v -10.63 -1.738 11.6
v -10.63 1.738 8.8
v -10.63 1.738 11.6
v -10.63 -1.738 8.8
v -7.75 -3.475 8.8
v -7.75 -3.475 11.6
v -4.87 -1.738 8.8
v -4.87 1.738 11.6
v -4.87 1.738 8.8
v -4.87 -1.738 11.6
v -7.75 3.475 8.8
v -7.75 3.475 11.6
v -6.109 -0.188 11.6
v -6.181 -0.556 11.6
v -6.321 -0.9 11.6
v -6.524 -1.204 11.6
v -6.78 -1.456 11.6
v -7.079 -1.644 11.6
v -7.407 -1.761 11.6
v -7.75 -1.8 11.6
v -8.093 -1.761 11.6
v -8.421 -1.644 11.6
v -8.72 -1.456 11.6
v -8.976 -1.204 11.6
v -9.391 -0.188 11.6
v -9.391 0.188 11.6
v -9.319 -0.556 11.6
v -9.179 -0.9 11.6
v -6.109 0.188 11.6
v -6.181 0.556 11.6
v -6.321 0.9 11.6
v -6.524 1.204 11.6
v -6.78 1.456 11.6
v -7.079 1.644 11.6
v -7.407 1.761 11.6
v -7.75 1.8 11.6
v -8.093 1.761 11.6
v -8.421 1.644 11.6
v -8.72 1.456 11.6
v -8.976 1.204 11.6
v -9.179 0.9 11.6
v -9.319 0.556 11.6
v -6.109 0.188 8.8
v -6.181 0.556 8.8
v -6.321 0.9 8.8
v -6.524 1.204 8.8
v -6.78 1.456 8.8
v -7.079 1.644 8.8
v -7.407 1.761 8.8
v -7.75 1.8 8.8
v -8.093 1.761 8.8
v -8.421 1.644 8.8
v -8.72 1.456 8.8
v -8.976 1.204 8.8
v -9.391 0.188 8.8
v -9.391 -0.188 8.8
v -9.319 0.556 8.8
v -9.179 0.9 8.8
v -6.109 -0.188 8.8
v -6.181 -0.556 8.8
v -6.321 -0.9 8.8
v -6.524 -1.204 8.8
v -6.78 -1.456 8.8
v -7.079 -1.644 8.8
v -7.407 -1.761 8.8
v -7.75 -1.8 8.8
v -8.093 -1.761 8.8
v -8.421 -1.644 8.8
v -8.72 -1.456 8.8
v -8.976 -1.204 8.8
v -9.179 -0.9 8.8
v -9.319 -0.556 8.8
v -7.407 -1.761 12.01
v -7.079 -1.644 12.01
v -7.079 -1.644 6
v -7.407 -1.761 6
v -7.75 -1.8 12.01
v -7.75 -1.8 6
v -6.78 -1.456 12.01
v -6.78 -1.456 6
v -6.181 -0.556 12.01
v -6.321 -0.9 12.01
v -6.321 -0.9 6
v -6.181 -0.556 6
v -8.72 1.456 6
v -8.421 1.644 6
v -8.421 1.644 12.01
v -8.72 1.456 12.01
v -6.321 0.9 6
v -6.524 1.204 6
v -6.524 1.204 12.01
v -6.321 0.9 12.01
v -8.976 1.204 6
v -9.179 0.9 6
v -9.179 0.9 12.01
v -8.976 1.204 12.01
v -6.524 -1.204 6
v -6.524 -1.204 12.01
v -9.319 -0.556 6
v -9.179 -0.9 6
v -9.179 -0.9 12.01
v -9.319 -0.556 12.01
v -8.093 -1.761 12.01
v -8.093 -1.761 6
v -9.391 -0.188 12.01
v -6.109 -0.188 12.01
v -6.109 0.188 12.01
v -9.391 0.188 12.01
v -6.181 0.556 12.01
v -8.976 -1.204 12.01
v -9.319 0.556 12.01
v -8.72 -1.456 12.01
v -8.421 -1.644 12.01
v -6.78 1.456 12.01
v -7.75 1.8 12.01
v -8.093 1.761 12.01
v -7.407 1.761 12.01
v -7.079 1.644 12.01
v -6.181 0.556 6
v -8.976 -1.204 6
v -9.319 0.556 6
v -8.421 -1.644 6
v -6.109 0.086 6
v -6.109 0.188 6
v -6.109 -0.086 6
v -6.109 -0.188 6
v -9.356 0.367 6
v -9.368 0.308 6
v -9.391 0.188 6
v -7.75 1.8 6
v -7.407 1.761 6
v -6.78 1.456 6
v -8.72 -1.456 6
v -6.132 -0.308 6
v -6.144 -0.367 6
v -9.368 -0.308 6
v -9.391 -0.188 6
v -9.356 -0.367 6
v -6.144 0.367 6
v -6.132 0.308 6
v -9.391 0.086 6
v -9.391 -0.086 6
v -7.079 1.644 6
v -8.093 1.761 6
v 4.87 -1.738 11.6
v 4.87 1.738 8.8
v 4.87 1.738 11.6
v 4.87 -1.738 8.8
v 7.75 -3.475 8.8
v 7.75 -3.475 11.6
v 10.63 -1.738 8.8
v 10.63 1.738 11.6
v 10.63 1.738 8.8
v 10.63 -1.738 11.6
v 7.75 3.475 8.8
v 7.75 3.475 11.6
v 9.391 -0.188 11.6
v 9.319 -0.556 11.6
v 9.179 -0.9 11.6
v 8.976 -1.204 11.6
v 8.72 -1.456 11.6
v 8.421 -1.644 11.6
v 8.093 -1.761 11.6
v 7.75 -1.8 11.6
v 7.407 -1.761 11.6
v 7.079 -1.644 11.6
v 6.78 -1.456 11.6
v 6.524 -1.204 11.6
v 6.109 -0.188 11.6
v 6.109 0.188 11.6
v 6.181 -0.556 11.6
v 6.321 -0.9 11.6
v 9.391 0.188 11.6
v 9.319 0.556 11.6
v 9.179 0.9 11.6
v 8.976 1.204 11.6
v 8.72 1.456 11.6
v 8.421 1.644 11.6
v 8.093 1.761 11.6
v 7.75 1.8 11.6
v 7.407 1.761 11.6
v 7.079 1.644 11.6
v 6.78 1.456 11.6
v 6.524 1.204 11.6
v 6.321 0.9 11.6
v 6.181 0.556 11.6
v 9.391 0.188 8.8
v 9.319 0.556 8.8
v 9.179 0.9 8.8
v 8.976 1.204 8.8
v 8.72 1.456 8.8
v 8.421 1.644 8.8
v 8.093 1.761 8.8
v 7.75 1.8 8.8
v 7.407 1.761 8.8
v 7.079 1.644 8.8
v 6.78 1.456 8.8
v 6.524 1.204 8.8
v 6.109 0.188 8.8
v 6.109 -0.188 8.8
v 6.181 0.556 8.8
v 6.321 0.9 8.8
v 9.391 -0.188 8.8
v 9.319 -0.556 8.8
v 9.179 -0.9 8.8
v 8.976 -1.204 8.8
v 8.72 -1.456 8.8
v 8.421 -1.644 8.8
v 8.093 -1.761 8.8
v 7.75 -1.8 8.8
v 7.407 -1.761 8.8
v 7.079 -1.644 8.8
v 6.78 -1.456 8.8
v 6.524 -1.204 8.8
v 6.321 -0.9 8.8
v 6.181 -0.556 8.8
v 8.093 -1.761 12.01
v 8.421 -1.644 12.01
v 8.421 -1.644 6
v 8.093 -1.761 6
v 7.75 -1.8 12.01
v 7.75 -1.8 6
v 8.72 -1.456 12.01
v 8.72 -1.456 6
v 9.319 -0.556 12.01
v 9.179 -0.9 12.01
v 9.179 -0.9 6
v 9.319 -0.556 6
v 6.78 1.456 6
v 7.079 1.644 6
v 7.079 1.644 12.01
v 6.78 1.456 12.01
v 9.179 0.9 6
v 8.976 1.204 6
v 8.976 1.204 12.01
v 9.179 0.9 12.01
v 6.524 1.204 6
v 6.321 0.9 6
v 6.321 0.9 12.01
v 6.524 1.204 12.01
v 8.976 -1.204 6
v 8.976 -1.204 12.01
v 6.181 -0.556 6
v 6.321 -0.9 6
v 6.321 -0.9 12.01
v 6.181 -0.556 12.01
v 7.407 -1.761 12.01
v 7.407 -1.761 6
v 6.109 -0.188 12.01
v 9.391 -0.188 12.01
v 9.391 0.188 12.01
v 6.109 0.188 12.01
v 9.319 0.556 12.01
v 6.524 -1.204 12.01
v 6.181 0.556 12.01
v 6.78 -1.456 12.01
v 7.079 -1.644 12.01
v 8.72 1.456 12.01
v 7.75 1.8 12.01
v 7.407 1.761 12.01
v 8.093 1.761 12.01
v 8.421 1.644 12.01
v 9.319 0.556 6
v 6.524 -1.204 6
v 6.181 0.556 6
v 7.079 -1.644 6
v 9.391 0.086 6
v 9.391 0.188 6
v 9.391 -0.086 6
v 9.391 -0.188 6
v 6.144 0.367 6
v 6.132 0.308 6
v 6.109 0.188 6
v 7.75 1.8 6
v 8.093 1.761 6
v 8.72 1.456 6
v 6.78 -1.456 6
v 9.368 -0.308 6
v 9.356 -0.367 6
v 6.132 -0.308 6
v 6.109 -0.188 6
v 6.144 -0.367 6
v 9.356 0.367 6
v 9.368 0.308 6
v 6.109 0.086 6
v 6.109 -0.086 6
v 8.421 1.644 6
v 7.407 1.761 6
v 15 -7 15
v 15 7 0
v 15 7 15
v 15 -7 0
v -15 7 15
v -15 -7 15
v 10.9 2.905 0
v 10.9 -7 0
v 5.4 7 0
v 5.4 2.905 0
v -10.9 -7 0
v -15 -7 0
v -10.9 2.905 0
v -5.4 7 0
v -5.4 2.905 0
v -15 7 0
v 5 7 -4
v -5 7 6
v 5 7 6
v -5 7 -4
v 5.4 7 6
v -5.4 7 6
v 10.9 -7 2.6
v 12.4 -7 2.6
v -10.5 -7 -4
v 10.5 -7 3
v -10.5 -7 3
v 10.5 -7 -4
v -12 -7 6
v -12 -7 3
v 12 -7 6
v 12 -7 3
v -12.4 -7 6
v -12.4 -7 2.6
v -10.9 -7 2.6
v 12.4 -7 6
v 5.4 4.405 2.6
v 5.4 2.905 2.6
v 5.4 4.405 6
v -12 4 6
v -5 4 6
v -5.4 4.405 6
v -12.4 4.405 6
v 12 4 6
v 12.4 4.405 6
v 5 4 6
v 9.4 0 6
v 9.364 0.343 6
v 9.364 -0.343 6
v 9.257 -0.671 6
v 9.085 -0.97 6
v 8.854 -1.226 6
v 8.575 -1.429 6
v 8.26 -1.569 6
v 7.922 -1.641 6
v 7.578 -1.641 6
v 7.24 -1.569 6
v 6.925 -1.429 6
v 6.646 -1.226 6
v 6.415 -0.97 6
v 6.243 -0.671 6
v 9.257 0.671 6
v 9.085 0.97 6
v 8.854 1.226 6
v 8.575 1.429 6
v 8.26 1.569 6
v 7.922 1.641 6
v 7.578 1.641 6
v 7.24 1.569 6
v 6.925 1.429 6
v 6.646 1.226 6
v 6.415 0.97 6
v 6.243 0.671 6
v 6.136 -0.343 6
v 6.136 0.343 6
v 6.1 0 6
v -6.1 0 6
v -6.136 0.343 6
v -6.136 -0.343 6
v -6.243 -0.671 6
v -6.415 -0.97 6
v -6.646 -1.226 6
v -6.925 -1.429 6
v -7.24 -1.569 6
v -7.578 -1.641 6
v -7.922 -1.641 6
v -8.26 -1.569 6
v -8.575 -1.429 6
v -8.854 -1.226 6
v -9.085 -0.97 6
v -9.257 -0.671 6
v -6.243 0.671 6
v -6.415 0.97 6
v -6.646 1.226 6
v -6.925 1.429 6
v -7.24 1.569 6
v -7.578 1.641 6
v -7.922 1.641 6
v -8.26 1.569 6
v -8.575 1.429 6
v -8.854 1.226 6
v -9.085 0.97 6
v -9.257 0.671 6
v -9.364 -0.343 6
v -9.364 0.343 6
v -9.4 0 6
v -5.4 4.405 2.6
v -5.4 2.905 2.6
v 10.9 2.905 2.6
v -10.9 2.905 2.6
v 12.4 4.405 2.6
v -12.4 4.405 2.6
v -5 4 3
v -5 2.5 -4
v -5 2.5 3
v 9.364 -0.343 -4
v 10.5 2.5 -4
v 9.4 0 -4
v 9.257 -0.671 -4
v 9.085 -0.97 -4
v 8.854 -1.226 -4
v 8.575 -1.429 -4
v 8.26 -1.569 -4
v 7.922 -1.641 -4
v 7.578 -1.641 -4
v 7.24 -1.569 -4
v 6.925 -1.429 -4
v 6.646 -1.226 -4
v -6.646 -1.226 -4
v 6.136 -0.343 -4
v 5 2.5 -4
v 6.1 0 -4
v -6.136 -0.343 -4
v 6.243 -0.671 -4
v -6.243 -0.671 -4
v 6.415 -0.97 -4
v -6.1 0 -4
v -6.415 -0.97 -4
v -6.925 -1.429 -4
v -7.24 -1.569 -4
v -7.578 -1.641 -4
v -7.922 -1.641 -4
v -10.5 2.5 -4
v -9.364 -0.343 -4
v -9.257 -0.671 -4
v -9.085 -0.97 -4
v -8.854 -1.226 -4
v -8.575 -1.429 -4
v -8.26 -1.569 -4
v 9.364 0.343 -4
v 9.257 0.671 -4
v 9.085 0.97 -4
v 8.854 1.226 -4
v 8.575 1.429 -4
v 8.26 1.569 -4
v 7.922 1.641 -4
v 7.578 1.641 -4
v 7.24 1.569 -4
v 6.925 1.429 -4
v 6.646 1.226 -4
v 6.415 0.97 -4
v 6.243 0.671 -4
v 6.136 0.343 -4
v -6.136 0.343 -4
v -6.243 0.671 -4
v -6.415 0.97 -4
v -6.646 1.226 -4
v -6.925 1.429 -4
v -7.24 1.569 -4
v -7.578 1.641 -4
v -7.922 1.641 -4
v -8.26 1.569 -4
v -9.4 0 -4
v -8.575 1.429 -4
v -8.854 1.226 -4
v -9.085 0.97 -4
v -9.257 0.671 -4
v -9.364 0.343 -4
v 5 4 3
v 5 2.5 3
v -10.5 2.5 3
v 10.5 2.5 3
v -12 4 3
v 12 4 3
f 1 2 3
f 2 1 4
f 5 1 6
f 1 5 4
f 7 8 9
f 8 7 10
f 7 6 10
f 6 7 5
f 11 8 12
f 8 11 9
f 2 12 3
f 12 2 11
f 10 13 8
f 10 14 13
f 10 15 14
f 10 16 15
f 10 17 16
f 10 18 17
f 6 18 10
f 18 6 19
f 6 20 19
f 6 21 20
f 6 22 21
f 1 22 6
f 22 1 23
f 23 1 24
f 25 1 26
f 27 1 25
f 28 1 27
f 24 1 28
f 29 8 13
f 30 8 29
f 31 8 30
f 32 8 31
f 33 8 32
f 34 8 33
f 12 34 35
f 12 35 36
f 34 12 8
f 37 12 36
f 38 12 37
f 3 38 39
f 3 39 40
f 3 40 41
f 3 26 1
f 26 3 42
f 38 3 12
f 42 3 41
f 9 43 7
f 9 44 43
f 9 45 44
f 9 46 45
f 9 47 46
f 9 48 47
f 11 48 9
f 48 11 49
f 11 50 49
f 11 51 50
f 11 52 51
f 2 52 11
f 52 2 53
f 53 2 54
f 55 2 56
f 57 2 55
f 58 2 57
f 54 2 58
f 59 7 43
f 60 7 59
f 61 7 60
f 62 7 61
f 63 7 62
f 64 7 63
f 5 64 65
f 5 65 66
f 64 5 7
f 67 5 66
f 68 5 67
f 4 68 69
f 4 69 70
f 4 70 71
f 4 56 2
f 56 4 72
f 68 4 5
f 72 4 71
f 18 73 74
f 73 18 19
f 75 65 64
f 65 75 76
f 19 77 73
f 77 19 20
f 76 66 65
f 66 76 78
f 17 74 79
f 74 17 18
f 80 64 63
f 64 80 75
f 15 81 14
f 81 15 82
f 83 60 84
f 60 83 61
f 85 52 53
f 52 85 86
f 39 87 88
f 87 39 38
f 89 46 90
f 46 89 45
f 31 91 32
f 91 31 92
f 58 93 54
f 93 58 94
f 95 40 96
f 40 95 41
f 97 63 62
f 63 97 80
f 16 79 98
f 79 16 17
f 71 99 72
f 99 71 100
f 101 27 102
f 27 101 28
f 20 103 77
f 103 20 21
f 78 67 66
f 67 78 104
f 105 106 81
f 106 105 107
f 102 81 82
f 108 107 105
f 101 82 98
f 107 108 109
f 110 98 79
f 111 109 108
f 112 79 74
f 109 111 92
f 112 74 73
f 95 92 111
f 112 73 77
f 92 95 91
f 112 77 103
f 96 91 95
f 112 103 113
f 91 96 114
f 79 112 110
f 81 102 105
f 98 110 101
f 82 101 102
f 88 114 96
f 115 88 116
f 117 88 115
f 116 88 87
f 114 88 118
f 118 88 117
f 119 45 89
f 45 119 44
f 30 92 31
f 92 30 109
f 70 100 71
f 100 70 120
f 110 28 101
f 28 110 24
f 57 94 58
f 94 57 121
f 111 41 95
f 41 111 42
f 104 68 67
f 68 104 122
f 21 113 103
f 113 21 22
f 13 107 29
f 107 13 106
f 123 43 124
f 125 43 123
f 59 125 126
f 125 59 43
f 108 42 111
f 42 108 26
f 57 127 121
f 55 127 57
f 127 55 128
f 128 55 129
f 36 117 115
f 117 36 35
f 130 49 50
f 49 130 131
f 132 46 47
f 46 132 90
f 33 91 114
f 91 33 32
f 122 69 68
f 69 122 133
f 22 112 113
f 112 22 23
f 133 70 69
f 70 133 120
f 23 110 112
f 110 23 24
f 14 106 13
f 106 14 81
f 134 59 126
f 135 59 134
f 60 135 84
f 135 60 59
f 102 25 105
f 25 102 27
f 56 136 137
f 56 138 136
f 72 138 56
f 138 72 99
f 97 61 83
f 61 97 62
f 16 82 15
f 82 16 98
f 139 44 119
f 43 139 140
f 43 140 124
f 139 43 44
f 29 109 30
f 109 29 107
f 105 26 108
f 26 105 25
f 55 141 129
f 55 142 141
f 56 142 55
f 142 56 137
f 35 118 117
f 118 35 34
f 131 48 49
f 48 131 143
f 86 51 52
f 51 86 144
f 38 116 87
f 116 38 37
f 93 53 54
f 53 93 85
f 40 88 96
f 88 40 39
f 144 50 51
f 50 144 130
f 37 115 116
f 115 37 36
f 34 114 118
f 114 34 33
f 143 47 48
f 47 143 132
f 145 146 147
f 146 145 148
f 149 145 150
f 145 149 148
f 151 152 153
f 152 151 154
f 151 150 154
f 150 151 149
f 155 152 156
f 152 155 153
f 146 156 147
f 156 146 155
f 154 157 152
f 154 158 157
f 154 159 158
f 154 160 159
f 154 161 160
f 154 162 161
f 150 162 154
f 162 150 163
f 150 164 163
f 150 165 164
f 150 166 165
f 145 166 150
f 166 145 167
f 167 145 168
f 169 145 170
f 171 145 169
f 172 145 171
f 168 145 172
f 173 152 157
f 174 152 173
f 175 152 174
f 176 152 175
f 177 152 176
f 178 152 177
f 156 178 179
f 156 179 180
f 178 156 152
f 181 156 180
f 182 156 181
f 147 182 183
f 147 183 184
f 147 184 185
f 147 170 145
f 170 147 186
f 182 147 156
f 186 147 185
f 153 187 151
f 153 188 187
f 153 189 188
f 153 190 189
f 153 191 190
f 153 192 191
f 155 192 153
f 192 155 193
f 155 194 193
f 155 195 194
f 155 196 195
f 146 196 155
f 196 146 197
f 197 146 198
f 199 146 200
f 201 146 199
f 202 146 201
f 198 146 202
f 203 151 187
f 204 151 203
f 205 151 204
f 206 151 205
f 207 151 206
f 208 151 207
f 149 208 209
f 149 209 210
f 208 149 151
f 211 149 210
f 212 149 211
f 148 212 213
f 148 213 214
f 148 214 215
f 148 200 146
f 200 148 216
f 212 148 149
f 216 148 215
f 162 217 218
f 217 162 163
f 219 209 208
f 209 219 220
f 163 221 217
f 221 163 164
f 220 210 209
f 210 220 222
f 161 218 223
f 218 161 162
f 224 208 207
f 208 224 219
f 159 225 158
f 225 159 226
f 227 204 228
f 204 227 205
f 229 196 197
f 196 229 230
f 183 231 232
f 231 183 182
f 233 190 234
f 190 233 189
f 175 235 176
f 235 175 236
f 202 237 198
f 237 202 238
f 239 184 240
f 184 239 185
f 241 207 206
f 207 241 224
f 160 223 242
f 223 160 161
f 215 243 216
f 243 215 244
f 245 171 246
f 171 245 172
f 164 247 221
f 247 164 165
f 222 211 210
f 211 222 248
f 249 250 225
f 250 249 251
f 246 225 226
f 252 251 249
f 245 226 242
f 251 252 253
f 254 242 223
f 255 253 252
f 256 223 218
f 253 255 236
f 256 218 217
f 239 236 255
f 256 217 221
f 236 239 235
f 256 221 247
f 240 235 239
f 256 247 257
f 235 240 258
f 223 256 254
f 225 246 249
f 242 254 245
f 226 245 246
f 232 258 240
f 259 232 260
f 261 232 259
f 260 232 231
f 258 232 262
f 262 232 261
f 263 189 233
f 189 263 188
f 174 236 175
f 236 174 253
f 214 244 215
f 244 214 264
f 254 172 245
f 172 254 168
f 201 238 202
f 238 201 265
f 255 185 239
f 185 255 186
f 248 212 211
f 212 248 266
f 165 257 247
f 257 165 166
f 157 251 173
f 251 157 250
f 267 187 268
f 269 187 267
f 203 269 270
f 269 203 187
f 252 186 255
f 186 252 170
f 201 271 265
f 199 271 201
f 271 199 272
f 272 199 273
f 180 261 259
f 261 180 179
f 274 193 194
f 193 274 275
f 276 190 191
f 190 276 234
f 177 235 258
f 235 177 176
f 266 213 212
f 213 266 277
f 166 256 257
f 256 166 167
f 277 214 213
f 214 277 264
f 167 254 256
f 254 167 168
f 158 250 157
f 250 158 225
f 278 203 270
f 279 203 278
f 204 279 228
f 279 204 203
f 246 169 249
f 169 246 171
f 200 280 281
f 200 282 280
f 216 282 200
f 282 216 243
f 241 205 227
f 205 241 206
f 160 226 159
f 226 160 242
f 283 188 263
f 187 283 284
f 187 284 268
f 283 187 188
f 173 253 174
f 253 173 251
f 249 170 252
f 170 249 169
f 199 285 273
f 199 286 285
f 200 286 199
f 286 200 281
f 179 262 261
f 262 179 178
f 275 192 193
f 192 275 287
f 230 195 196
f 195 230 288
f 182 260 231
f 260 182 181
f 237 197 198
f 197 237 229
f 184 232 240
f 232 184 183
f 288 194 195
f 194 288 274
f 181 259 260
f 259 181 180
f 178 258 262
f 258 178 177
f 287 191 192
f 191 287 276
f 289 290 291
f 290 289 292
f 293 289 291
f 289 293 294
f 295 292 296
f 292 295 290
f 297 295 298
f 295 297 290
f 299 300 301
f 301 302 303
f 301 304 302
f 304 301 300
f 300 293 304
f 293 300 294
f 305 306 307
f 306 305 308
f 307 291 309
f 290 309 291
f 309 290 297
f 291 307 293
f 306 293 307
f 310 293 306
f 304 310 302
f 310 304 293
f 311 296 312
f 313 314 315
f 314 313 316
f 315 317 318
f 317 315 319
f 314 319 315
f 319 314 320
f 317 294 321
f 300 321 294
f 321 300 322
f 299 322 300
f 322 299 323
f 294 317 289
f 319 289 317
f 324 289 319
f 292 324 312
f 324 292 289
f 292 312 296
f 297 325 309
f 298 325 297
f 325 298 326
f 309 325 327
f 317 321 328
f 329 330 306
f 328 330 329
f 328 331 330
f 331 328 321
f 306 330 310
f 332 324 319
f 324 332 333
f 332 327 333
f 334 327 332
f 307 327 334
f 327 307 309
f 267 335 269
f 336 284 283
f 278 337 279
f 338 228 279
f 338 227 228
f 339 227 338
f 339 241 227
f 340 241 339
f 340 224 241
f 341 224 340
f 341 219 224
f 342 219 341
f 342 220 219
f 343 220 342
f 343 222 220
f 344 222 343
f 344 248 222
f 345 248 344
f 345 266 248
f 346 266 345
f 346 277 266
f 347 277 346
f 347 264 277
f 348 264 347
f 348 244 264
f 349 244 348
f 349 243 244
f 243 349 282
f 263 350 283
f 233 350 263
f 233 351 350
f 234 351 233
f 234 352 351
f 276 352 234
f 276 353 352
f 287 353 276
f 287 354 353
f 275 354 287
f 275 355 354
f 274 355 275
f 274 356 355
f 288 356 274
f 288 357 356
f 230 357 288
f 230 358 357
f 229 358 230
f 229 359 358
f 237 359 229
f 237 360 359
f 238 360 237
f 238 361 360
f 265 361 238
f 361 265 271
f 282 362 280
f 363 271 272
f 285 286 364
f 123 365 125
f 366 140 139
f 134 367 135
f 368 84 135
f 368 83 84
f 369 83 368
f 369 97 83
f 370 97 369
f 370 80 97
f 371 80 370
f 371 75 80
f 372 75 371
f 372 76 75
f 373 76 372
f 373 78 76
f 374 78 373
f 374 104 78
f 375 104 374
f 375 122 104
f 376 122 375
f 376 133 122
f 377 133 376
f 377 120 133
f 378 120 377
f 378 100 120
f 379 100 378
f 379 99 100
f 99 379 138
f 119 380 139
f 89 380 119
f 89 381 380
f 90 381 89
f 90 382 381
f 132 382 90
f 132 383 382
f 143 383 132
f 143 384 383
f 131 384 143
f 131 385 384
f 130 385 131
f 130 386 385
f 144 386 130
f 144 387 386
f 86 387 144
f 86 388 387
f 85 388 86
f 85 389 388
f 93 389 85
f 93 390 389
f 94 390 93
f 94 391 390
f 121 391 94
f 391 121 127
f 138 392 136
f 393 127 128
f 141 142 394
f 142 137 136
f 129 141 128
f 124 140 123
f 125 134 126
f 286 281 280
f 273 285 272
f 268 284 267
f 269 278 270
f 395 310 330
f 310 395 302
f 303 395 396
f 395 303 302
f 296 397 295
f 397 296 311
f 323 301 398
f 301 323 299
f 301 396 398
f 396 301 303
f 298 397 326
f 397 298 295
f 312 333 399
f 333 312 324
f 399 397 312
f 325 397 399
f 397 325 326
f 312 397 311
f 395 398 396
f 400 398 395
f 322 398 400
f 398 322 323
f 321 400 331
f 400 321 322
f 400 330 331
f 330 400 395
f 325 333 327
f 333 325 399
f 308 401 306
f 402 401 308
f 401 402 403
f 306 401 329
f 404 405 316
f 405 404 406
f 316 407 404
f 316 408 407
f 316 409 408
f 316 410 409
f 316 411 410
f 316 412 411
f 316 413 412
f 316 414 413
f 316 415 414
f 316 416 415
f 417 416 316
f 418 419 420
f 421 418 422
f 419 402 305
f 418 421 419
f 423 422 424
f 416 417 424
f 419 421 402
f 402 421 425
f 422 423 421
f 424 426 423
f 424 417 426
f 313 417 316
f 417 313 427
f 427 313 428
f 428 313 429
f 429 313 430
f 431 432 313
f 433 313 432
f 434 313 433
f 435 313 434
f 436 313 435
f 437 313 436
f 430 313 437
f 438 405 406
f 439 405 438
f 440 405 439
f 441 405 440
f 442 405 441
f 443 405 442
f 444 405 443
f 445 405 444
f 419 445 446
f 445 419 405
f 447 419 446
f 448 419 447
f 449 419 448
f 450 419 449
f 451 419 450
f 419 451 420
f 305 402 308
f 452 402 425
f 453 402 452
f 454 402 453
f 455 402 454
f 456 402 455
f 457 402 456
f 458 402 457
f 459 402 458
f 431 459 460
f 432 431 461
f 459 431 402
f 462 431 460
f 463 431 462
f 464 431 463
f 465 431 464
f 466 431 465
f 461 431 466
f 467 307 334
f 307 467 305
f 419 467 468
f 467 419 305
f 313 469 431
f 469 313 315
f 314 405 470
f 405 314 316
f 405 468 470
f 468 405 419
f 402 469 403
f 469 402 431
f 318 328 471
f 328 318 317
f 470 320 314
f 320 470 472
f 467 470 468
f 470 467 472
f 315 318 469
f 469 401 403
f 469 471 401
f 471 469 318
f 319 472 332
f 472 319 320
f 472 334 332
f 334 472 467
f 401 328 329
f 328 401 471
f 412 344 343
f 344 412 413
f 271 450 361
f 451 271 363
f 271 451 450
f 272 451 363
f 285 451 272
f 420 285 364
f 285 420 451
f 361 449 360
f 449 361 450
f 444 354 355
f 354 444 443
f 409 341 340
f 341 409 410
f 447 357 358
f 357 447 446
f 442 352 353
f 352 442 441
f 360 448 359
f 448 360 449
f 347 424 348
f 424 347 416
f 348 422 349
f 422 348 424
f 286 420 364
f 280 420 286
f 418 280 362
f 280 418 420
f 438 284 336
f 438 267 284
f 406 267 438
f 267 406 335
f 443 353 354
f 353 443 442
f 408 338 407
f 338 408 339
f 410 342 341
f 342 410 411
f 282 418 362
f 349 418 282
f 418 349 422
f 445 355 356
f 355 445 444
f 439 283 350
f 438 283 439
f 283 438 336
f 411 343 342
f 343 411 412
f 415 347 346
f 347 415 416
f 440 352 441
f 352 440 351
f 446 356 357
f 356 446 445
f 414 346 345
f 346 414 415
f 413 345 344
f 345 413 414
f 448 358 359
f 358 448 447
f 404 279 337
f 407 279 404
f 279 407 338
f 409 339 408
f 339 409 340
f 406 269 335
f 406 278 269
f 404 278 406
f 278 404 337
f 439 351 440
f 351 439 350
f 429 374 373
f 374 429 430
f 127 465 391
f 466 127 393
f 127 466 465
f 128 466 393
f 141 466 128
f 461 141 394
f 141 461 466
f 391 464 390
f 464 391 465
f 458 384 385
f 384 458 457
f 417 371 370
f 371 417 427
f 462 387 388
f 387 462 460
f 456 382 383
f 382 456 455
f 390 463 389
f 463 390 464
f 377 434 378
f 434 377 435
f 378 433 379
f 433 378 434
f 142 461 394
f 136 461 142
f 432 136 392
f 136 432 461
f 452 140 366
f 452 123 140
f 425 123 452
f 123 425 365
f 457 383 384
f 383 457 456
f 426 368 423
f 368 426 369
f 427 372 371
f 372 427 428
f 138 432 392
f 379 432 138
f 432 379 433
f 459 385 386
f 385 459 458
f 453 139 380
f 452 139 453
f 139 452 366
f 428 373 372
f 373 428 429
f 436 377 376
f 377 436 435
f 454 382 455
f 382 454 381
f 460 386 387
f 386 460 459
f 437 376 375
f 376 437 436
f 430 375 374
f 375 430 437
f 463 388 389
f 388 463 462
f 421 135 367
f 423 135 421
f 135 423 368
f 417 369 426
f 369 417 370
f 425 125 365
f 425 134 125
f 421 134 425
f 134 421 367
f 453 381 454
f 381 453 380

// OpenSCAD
// BambuLab A1 Mounting Bracket
include <BOSL2/std.scad>

/* [Bracket Dimensions (mm)] */
bracket_thickness = 5; // [3:1:10]
bracket_width = 50; // [10:1:50]
dovetail_depth = 5; // [10:1:30]
dovetail_gap = .6; // [.1:.1:1]

/* [Hidden] */
//$preview = true;
local = 0;
$fa = $preview ? 8 : 1;
$fs = $preview ? 1 : 0.1;

// Manifest dimensions (A1 traversal)
a1_inner_width = 40.5;
a1_inner_height = 20.5;
a1_inner_radius = 5;

wall_thickness = 1.5; // [0.4:0.1:5]
layer_height = 0.2;
tolerance = 0.25;
epsilon = 0.05;
chamfer = 0.3;


// Generates an open 2D path that wraps left/right along the front wall face
function dovetail_flanged_wall_path(width=dovetail_depth / 4, depth=dovetail_depth, angle=45, flange_width=35, tolerance=tolerance) =
    let(
        w_neck = width + (2 * tolerance),
        w_base = w_neck + (2 * depth * tan(angle)),

        // Coordinates for the flanged track running along the face and into the socket:
        p1 = [-w_neck/2 - flange_width, 0], // Far Left Flange (on the face)
        p2 = [-w_neck/2, 0],                // Left Neck Entry
        p3 = [-w_base/2, -depth],           // Deep Left Base
        p4 = [ w_base/2, -depth],           // Deep Right Base
        p5 = [ w_neck/2, 0],                // Right Neck Entry
        p6 = [ w_neck/2 + flange_width, 0]  // Far Right Flange (on the face)
    )
    [p1, p2, p3, p4, p5, p6];


module rounded_layer(size) {
    intersection() {
        cuboid([size, size, epsilon],
               anchor=TOP);
        cuboid([size, size, 4 * wall_thickness],
               rounding=2 * wall_thickness, anchor=TOP);
    }
}


// ====================================================================
// A1 Mounting Bracket
// ====================================================================

module bracket_block(chamfer=0, extend_y=0, extend_z=0) {
    cuboid([bracket_width,
            a1_inner_width + 2 * extend_y,
            a1_inner_height + 2 * extend_z],
           chamfer = chamfer);
}

module dovetail_cutter() {
    dt_path = dovetail_flanged_wall_path(flange_width=a1_inner_height);
    smooth_path = round_corners(dt_path, radius=1.5 * chamfer, closed=false);
    linear_extrude(height=bracket_width, center=true)
        stroke(smooth_path, width=dovetail_gap, closed=false);
}

module a1_bracket() {
    difference() {
        //color("lime", alpha=.3)
            bracket_block(extend_y=bracket_thickness,
                          extend_z=2 * dovetail_depth + bracket_thickness,
                          chamfer=2 * chamfer);

        yrot(90)
        cuboid([a1_inner_height,
                a1_inner_width,
                bracket_width + epsilon],
            chamfer = -chamfer);

        up(a1_inner_height / 2 + 1.5 * dovetail_depth)
            yrot(90) dovetail_cutter();
        down(a1_inner_height / 2 + 1.5 * dovetail_depth)
            yrot(90) dovetail_cutter();
    }
}


// ====================================================================
// Tapo C230 Camera Mount
// ====================================================================

c230_bar_diameter = 44; // [30:1:100]
c230_bar_width = 7; // [3:1:30]
c230_top_diameter = 29; // [10:0.1:50]
c230_bottom_diameter = 31; // [10:0.1:50]
c230_cone_height = 6; // [2:0.25:20]

c230_bar_height = wall_thickness;


module c230_friction_dot(direction=1) {
    up(c230_cone_height - .85 * c230_bar_height)
    fwd(direction * (c230_bar_diameter / 2 - wall_thickness))
    left(direction * (c230_bar_width / 2 - wall_thickness))
        spheroid(r=c230_bar_height / 2);
}

module c230_camera_holder() {
    union() {
        // Twist-lock bar tongues
        up(c230_cone_height)
        intersection() {
            cyl(
                h=c230_bar_height,
                d=c230_bar_diameter,
                anchor=TOP
            );
            up(wall_thickness / 2)
            cuboid([c230_bar_width, c230_bar_diameter, 2 * c230_bar_height],
                   rounding=wall_thickness, anchor=TOP);
        }

        zrot(45) hull() {
            up(c230_cone_height)
                rounded_layer(c230_top_diameter - 4 * wall_thickness);
            up(c230_cone_height - wall_thickness / 2)
                rounded_layer(c230_top_diameter - 2 * wall_thickness);
        }
        zrot(45) hull() {
            up(c230_cone_height - wall_thickness / 2)
                rounded_layer(c230_top_diameter - 2 * wall_thickness);
            rounded_layer(c230_bottom_diameter);
        }

        // Supporting chamfers for the bar
        up(c230_cone_height)
            cuboid([c230_bar_width - wall_thickness / 2,
                    c230_top_diameter + 2 * wall_thickness,
                    2 * wall_thickness],
                   chamfer=wall_thickness, anchor=TOP);

        // Friction dots
        c230_friction_dot(direction=1);
        c230_friction_dot(direction=-1);
    }
}


// ====================================================================
// Main Assembly & Plates
// ====================================================================

module mw_plate_1() {
    up(bracket_width / 2) yrot(90) a1_bracket();
}

module mw_plate_2() {
    up(bracket_width / 2) yrot(90) union() {
        a1_bracket();
        fwd(a1_inner_width / 2 + bracket_thickness - epsilon)
        yrot(90) xrot(90)
        c230_camera_holder();
    }
}

if ($preview || local) { // main assembly in Parametric Model Maker
    mw_plate_1();
}
